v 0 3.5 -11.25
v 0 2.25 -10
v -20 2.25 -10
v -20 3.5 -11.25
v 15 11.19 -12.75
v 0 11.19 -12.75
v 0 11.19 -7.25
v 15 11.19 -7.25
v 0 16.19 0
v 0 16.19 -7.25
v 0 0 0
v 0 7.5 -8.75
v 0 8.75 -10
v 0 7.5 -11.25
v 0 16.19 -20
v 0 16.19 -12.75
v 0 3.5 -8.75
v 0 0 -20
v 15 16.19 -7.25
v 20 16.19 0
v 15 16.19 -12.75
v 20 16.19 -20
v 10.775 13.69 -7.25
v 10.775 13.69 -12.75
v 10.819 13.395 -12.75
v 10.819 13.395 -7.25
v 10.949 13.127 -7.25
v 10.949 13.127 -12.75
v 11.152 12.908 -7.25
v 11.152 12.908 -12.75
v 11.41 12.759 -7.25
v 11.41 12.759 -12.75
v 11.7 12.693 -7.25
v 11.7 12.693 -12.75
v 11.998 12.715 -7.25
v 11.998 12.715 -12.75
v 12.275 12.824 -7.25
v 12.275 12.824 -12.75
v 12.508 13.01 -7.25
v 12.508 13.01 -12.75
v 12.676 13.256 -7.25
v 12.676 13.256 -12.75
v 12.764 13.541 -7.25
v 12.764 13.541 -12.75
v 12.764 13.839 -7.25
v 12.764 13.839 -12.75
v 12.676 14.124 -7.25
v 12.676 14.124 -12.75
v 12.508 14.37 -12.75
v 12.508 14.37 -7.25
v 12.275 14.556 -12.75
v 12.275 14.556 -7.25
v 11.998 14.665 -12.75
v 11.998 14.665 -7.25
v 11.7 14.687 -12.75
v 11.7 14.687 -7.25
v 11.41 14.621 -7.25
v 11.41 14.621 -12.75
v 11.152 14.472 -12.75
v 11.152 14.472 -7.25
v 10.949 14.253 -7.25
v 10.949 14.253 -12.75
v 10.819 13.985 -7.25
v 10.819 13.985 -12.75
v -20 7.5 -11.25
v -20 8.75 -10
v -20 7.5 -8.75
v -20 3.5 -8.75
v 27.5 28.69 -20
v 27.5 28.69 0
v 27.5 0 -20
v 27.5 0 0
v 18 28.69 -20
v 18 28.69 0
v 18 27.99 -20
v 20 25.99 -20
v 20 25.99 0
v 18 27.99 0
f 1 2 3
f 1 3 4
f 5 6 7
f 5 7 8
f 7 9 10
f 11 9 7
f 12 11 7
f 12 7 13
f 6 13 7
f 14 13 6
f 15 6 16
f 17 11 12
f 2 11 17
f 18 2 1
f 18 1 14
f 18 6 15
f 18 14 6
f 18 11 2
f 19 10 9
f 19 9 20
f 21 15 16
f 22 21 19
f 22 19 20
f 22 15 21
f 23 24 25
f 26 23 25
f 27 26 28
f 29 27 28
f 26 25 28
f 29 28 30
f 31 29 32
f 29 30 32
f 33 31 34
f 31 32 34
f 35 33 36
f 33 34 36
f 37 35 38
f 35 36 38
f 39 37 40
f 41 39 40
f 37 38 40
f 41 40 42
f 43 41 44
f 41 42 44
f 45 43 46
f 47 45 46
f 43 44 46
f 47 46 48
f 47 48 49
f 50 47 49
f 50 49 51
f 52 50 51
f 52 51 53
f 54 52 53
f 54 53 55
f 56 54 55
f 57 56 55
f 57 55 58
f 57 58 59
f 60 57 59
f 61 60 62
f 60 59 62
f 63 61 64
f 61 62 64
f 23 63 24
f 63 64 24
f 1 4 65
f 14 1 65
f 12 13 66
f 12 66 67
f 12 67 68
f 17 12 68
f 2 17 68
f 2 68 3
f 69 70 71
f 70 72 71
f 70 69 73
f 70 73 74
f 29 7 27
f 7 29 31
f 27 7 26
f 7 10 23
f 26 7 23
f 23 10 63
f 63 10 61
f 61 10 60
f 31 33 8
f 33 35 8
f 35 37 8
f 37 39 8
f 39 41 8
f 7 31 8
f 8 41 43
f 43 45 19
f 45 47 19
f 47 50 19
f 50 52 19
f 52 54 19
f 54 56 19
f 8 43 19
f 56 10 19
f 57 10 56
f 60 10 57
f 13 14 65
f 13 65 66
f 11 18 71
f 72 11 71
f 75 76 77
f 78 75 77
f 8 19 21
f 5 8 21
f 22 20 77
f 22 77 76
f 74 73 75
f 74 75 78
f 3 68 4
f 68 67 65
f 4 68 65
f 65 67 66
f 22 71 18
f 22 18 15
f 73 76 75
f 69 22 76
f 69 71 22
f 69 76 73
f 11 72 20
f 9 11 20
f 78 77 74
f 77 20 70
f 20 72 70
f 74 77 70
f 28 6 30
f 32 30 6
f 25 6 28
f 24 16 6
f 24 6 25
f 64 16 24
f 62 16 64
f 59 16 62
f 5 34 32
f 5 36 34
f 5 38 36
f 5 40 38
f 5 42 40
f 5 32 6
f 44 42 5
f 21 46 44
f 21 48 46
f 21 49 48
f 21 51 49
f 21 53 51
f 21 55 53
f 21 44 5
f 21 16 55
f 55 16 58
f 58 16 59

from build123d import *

# Parameters (mm, degrees)
ESQUISSE1_W             = 27.5
ESQUISSE1_H             = 20
BOSS_EXTRU_1_DEPTH      = 16.19
ESQUISSE2_W             = 7.5
ESQUISSE2_H             = 20
BOSS_EXTRU_2_DEPTH      = 12.5
BOSS_EXTRU_4_DEPTH      = 20
ESQUISSE5_W             = 15
ESQUISSE5_H             = 5.5
ENL_V_MAT_EXTRU_1_DEPTH = 5
ESQUISSE11_R            = 1
BOSS_EXTRU_5_DEPTH      = 5.5
ESQUISSE12_W            = 20
ESQUISSE12_H            = 2.7
BOSS_EXTRU_6_DEPTH      = 2
CHANFREIN1_SIZE         = 2


with BuildPart() as part:
    # Esquisse1 → Boss.-Extru.1 (new body)
    with BuildSketch(Plane(origin=(0, 0, 0), x_dir=(1, 0, 0), z_dir=(0, 1, 0))):
        with Locations((13.75, 10)):
            Rectangle(ESQUISSE1_W, ESQUISSE1_H)
    extrude(amount=BOSS_EXTRU_1_DEPTH)

    # Esquisse2 → Boss.-Extru.2 (add)
    with BuildSketch(Plane(origin=(0, 16.19, 0), x_dir=(1, 0, 0), z_dir=(0, 1, 0))):
        with Locations((23.75, 10)):
            Rectangle(ESQUISSE2_W, ESQUISSE2_H)
    extrude(amount=BOSS_EXTRU_2_DEPTH)

    # Esquisse4 → Boss.-Extru.4 (add)
    with BuildSketch(Plane.ZY):
        Polygon((-8.75, 7.5), (-8.75, 3.5), (-10, 2.25), (-11.25, 3.5), (-11.25, 7.5), (-10, 8.75), align=None)
    extrude(amount=BOSS_EXTRU_4_DEPTH)

    # Esquisse5 → Enlèv. mat.-Extru.1 (cut)
    with BuildSketch(Plane(origin=(0, 16.19, 0), x_dir=(1, 0, 0), z_dir=(0, 1, 0))):
        with Locations((7.5, 10)):
            Rectangle(ESQUISSE5_W, ESQUISSE5_H)
    extrude(amount=-ENL_V_MAT_EXTRU_1_DEPTH, mode=Mode.SUBTRACT)

    # Esquisse11 → Boss.-Extru.5 (add)
    with BuildSketch(Plane.XY.offset(-12.75)):
        with Locations(Location((11.77506405, 13.69, 0), (0, 0, 180))):
            Circle(ESQUISSE11_R)
    extrude(amount=BOSS_EXTRU_5_DEPTH)

    # Esquisse12 → Boss.-Extru.6 (add)
    with BuildSketch(Plane.ZY.offset(-20)):
        with Locations((-10, 27.34)):
            Rectangle(ESQUISSE12_W, ESQUISSE12_H)
    extrude(amount=BOSS_EXTRU_6_DEPTH)

    # Chanfrein1
    chanfrein1_edges = [part.edges().sort_by_distance(p)[0] for p in [
        (18, 25.99, -10),
    ]]
    chamfer(chanfrein1_edges, length=CHANFREIN1_SIZE - 0.0001)  # a hair under: the kernel refuses the full size


solid = part.part
